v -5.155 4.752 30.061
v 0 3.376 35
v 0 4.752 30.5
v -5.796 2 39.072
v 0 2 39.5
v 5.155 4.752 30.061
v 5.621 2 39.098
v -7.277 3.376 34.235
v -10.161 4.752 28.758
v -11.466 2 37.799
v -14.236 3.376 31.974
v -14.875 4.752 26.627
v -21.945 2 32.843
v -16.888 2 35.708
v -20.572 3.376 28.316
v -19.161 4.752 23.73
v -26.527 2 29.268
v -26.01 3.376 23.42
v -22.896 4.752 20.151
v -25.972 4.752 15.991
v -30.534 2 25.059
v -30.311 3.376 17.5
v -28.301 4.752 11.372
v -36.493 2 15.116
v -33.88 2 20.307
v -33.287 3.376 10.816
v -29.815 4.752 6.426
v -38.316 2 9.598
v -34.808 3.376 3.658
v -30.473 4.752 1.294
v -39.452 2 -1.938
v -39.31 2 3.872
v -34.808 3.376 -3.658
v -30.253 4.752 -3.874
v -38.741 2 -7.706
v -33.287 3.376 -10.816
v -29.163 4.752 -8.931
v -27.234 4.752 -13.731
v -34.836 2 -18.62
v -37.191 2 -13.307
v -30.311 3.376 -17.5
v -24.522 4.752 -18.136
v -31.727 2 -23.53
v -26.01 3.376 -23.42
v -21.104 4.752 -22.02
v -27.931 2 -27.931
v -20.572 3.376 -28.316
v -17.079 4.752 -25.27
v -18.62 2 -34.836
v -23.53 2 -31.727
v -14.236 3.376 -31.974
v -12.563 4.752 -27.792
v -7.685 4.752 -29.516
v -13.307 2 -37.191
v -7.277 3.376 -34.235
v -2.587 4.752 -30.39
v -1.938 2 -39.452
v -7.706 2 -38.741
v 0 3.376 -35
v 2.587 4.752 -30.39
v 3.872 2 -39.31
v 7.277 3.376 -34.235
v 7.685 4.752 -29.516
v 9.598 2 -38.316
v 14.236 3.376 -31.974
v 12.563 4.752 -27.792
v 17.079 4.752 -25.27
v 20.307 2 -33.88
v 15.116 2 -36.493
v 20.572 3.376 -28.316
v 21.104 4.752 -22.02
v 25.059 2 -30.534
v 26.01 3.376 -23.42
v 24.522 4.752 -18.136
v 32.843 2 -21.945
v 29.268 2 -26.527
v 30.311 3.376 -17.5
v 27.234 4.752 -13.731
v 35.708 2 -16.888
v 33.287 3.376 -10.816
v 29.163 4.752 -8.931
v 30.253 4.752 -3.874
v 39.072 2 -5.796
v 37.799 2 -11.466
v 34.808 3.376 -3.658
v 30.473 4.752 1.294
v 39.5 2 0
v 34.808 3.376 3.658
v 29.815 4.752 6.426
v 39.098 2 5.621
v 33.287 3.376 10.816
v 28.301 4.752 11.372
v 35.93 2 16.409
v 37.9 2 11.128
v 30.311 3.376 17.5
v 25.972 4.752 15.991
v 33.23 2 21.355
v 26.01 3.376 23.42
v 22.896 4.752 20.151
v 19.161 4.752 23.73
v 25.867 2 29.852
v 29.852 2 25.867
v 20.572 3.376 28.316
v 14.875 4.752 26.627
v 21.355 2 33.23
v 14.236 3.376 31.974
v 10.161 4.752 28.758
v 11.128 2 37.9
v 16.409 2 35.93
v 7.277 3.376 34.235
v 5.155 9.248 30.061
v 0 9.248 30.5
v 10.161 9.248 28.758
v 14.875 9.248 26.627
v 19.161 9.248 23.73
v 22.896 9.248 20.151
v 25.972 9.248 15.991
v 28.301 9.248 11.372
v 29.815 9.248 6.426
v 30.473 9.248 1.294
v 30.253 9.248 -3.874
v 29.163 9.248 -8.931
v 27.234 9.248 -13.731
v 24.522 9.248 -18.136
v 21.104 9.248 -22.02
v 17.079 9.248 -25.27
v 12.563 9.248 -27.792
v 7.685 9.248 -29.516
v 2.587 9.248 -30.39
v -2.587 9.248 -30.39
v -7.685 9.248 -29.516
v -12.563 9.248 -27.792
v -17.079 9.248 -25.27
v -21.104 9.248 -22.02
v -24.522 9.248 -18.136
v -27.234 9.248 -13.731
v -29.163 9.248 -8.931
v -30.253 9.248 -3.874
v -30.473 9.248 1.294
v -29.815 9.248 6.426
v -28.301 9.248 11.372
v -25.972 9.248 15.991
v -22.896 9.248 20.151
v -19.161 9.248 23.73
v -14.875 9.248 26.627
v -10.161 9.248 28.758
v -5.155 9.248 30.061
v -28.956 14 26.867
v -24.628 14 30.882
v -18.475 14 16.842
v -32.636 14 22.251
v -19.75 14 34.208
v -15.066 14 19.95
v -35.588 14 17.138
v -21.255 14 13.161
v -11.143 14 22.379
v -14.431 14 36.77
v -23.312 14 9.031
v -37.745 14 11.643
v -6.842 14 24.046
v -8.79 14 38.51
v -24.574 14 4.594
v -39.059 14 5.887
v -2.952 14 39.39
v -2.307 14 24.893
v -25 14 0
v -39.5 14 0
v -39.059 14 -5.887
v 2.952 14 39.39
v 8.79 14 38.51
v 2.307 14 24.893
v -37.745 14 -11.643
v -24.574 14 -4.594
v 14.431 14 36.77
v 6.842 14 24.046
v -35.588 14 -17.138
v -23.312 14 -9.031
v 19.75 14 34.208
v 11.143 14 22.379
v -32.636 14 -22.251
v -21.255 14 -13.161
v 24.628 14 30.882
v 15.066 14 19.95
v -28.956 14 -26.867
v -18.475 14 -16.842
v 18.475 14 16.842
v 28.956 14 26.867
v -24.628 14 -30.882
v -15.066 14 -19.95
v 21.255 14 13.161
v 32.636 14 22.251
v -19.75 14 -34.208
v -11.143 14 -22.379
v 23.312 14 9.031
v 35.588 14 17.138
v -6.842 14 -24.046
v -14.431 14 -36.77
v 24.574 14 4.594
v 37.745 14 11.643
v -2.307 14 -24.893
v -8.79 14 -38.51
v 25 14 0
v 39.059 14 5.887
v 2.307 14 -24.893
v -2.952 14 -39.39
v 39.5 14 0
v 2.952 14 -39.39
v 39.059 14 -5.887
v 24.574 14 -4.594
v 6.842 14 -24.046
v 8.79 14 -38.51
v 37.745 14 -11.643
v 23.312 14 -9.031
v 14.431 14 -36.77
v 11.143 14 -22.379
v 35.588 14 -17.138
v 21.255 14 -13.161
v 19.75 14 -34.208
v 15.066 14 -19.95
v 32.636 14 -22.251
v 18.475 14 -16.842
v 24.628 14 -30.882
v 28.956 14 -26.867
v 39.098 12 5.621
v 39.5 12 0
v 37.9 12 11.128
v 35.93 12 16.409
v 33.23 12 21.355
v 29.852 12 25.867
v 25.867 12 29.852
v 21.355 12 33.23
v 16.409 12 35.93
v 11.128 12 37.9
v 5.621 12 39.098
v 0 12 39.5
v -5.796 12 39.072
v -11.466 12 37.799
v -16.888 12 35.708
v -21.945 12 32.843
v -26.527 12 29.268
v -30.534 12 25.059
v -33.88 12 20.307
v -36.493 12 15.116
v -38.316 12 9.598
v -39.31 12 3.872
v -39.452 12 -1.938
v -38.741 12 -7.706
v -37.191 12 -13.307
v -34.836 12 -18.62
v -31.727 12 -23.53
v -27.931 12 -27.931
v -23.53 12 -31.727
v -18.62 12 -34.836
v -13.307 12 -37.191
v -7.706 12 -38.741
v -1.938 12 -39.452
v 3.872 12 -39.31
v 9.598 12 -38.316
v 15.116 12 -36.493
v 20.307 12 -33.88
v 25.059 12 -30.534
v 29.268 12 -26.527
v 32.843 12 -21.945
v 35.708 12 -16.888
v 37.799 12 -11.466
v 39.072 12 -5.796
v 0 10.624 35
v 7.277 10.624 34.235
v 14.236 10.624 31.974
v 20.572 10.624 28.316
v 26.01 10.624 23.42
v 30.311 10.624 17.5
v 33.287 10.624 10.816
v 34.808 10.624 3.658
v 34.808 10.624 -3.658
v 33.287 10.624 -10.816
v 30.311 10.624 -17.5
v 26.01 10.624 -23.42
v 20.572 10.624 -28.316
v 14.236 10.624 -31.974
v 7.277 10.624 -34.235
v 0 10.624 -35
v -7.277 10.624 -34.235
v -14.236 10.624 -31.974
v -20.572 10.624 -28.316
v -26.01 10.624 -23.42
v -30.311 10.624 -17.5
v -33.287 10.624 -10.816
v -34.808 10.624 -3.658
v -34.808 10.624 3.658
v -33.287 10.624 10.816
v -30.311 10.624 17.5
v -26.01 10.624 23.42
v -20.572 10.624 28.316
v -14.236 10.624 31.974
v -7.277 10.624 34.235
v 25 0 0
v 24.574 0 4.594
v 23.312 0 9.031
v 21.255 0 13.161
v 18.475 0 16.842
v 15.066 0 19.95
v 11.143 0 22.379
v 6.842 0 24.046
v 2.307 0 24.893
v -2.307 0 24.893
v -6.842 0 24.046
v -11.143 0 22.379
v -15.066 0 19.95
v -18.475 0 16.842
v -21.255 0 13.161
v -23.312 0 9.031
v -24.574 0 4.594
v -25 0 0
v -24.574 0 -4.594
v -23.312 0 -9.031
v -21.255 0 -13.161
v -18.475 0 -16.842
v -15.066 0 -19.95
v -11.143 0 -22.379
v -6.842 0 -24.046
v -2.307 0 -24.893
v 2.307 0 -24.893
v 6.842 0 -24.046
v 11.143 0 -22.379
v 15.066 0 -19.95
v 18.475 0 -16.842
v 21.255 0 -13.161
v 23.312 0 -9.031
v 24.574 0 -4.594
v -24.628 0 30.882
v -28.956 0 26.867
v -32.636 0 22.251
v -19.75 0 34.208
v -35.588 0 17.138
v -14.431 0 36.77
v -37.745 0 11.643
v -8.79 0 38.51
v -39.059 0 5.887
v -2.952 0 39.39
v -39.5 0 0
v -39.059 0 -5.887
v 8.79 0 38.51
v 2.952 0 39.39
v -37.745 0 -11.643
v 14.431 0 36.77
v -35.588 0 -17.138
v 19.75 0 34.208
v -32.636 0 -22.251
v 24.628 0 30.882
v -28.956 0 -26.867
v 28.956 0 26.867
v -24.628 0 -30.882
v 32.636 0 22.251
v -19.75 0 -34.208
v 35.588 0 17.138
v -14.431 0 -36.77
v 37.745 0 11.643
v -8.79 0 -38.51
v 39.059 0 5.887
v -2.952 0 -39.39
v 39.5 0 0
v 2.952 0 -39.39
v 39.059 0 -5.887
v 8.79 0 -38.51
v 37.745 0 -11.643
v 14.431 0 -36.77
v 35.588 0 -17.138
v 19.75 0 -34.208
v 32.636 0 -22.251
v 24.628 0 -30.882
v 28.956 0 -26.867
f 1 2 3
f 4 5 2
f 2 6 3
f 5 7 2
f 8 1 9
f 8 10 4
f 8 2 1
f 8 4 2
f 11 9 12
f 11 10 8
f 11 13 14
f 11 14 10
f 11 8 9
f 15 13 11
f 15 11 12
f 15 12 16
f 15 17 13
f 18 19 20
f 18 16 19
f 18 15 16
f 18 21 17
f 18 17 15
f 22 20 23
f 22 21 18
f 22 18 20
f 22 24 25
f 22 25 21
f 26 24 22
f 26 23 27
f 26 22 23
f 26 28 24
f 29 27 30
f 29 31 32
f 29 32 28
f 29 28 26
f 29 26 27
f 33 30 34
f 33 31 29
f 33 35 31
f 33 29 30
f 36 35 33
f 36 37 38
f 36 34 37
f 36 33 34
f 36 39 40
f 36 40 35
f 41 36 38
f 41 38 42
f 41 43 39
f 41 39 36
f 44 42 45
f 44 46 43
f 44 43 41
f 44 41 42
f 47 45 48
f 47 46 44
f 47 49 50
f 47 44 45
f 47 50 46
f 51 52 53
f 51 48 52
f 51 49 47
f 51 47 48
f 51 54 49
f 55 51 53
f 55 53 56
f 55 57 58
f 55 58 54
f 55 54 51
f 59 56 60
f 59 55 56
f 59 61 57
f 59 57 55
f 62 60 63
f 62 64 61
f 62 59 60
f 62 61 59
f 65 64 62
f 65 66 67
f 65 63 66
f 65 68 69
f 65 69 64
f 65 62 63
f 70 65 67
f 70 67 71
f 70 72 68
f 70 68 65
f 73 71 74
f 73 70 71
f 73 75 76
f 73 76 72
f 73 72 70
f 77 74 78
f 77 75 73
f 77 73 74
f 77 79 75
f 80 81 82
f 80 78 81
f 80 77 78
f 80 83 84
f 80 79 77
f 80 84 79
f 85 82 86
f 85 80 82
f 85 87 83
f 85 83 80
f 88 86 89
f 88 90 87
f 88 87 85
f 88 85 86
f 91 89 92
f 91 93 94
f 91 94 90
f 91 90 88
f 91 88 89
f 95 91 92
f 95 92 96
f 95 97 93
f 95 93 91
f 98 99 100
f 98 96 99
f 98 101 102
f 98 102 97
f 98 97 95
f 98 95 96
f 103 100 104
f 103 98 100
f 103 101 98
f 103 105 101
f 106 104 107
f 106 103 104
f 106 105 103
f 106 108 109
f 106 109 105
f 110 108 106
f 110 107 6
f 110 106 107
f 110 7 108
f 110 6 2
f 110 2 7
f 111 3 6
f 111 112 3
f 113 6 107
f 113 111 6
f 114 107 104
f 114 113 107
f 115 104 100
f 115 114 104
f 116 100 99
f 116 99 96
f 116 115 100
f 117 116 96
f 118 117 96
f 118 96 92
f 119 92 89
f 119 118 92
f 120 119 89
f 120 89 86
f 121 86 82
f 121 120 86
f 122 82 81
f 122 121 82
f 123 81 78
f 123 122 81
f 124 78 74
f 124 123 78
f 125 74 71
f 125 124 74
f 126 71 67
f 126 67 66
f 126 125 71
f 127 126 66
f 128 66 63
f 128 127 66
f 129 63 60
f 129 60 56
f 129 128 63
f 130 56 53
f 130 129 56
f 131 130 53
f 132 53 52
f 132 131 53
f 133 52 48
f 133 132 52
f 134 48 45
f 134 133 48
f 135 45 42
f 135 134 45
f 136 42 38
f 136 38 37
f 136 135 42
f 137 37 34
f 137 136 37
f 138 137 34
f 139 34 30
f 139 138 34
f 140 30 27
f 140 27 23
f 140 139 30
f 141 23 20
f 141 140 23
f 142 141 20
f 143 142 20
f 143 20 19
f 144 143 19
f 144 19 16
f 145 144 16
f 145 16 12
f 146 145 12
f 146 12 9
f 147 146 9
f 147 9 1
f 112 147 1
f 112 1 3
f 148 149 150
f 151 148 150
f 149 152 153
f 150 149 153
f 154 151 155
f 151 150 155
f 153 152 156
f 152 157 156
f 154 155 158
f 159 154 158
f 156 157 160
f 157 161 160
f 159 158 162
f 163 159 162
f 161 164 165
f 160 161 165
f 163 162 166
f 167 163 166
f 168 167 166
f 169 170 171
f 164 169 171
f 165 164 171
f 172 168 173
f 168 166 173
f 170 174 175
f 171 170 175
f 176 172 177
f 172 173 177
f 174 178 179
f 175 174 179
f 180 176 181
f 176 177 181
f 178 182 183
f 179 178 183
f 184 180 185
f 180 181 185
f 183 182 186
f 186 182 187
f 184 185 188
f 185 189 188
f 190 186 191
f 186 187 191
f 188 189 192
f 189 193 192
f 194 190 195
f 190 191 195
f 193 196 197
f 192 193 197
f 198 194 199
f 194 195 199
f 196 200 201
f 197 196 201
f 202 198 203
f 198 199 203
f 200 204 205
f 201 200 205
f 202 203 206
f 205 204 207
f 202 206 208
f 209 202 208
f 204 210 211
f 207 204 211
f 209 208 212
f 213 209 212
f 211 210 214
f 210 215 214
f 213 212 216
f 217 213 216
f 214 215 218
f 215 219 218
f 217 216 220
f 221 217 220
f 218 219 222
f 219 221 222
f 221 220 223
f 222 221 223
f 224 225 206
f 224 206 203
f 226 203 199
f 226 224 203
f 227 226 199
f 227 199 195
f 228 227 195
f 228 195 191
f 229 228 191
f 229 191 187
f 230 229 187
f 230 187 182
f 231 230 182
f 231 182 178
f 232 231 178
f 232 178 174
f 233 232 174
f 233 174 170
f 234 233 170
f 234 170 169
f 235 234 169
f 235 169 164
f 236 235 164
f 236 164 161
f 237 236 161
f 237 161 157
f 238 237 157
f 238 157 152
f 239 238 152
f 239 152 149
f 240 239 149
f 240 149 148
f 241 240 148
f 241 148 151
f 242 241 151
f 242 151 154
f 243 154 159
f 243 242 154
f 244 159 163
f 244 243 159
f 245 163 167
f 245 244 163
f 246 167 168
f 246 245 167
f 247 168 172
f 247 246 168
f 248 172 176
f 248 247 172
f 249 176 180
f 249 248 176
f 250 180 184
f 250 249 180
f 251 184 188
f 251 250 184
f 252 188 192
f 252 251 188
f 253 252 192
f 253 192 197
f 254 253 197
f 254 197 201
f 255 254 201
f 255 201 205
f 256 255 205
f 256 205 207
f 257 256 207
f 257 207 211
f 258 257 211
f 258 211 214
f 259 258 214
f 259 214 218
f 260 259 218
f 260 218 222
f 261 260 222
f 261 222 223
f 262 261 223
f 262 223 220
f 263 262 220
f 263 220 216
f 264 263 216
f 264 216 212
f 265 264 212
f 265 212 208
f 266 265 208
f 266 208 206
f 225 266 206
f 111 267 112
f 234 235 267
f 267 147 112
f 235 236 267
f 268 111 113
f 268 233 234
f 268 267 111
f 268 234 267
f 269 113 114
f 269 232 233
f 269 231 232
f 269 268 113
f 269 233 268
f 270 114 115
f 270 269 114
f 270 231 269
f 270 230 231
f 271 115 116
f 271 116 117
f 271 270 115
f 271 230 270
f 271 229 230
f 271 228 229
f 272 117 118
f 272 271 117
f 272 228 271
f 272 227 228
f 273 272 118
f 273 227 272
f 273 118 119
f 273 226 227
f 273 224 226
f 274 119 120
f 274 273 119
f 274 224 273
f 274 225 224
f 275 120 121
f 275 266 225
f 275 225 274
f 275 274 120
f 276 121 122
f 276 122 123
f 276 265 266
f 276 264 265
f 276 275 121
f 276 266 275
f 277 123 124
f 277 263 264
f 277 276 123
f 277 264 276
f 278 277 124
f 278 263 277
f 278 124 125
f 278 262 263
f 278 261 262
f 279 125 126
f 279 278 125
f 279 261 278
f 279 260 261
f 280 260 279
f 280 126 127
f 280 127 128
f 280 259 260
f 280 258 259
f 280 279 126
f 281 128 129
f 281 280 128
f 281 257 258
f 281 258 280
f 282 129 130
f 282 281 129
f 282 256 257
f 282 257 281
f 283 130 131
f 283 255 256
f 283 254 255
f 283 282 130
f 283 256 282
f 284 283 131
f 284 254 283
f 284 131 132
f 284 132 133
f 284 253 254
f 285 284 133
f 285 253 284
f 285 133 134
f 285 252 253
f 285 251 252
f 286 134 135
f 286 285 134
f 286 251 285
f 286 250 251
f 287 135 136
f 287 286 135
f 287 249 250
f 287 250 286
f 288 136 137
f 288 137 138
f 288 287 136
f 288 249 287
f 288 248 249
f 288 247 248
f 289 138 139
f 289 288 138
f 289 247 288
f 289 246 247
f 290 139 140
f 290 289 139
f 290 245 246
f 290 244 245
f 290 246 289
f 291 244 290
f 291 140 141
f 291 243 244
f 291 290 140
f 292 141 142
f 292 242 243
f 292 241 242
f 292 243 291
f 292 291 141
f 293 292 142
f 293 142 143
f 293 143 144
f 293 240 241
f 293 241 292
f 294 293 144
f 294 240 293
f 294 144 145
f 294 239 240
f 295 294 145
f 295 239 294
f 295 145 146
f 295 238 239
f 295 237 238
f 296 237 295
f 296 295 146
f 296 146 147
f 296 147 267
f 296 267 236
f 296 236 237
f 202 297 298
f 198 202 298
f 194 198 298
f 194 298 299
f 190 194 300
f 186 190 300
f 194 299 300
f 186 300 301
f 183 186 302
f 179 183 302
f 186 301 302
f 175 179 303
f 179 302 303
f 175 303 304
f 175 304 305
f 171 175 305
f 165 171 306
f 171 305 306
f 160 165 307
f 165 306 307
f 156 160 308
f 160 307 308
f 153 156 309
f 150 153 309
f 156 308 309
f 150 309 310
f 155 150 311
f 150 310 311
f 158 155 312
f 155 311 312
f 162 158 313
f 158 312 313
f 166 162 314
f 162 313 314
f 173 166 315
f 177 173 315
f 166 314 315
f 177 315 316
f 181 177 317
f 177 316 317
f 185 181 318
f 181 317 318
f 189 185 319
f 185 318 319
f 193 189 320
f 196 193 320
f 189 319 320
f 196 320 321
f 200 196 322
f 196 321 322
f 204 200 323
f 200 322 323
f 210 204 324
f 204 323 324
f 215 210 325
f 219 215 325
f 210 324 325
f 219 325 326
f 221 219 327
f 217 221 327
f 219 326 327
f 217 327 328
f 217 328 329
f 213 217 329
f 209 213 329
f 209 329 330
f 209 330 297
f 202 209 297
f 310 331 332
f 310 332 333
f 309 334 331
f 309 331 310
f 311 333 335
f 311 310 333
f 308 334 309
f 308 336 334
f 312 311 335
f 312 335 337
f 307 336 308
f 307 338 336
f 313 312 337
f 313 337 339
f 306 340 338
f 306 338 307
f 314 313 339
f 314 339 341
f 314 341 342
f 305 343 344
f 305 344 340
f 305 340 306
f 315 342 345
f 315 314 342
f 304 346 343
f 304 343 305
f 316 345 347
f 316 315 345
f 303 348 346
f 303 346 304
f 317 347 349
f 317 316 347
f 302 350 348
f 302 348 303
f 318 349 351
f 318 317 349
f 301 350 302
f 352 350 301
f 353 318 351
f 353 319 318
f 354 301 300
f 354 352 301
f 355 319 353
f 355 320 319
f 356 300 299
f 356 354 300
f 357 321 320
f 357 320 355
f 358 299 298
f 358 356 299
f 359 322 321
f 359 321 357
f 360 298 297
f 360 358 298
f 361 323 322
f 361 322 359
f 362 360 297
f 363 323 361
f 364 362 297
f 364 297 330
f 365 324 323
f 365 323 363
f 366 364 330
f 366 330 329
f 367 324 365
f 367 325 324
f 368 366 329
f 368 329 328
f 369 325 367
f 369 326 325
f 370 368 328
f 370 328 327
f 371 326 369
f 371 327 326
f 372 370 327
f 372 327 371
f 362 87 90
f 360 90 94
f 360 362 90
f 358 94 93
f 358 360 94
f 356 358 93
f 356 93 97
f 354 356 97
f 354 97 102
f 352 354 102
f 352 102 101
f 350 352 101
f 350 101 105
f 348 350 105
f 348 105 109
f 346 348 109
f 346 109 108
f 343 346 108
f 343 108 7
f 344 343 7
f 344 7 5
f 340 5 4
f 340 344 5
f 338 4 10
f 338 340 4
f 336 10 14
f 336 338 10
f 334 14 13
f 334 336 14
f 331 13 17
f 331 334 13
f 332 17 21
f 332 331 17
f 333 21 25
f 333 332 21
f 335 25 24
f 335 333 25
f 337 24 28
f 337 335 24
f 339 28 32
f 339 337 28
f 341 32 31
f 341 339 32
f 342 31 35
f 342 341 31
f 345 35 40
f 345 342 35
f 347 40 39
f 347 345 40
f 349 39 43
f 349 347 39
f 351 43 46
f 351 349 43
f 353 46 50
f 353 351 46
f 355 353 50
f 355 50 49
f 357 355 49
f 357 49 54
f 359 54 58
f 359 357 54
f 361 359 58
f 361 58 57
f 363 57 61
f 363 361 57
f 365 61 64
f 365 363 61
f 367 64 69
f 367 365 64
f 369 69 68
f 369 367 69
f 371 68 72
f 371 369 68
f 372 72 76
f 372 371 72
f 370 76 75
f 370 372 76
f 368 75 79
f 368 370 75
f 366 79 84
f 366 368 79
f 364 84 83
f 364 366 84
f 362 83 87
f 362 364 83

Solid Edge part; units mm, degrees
sketch "Sketch1" plane through (0, 0, 0) normal (0, -1, 0) x (1, 0, 0)
  circle A0 centre (0, 0) radius 39.5
  dimension "D1" = 79
extrude "Protrusion1" add sketch "Sketch1" against normal blind 14
sketch "Sketch2" plane through (0, 0, 0) normal (0, -1, 0) x (1, 0, 0)
  circle A0 centre (0, 0) radius 25
  dimension "D1" = 50
extrude "Cutout1" cut sketch "Sketch2" against normal up to next
sketch "Sketch3" plane through (0, 0, 0) normal (1, 0, 0) x (0, 1, 0)
  line L0 (2, 39.5) -> (4.7516, 30.5)
  line L1 (4.7516, 30.5) -> (9.2484, 30.5)
  line L2 (9.2484, 30.5) -> (12, 39.5)
  line L3 (12, 39.5) -> (2, 39.5)
revolve "RevolvedCutout1" cut sketch "Sketch3" angle 360 about axis through (0, 0, 0) along (0, 1, 0)
properties material "Steel"
